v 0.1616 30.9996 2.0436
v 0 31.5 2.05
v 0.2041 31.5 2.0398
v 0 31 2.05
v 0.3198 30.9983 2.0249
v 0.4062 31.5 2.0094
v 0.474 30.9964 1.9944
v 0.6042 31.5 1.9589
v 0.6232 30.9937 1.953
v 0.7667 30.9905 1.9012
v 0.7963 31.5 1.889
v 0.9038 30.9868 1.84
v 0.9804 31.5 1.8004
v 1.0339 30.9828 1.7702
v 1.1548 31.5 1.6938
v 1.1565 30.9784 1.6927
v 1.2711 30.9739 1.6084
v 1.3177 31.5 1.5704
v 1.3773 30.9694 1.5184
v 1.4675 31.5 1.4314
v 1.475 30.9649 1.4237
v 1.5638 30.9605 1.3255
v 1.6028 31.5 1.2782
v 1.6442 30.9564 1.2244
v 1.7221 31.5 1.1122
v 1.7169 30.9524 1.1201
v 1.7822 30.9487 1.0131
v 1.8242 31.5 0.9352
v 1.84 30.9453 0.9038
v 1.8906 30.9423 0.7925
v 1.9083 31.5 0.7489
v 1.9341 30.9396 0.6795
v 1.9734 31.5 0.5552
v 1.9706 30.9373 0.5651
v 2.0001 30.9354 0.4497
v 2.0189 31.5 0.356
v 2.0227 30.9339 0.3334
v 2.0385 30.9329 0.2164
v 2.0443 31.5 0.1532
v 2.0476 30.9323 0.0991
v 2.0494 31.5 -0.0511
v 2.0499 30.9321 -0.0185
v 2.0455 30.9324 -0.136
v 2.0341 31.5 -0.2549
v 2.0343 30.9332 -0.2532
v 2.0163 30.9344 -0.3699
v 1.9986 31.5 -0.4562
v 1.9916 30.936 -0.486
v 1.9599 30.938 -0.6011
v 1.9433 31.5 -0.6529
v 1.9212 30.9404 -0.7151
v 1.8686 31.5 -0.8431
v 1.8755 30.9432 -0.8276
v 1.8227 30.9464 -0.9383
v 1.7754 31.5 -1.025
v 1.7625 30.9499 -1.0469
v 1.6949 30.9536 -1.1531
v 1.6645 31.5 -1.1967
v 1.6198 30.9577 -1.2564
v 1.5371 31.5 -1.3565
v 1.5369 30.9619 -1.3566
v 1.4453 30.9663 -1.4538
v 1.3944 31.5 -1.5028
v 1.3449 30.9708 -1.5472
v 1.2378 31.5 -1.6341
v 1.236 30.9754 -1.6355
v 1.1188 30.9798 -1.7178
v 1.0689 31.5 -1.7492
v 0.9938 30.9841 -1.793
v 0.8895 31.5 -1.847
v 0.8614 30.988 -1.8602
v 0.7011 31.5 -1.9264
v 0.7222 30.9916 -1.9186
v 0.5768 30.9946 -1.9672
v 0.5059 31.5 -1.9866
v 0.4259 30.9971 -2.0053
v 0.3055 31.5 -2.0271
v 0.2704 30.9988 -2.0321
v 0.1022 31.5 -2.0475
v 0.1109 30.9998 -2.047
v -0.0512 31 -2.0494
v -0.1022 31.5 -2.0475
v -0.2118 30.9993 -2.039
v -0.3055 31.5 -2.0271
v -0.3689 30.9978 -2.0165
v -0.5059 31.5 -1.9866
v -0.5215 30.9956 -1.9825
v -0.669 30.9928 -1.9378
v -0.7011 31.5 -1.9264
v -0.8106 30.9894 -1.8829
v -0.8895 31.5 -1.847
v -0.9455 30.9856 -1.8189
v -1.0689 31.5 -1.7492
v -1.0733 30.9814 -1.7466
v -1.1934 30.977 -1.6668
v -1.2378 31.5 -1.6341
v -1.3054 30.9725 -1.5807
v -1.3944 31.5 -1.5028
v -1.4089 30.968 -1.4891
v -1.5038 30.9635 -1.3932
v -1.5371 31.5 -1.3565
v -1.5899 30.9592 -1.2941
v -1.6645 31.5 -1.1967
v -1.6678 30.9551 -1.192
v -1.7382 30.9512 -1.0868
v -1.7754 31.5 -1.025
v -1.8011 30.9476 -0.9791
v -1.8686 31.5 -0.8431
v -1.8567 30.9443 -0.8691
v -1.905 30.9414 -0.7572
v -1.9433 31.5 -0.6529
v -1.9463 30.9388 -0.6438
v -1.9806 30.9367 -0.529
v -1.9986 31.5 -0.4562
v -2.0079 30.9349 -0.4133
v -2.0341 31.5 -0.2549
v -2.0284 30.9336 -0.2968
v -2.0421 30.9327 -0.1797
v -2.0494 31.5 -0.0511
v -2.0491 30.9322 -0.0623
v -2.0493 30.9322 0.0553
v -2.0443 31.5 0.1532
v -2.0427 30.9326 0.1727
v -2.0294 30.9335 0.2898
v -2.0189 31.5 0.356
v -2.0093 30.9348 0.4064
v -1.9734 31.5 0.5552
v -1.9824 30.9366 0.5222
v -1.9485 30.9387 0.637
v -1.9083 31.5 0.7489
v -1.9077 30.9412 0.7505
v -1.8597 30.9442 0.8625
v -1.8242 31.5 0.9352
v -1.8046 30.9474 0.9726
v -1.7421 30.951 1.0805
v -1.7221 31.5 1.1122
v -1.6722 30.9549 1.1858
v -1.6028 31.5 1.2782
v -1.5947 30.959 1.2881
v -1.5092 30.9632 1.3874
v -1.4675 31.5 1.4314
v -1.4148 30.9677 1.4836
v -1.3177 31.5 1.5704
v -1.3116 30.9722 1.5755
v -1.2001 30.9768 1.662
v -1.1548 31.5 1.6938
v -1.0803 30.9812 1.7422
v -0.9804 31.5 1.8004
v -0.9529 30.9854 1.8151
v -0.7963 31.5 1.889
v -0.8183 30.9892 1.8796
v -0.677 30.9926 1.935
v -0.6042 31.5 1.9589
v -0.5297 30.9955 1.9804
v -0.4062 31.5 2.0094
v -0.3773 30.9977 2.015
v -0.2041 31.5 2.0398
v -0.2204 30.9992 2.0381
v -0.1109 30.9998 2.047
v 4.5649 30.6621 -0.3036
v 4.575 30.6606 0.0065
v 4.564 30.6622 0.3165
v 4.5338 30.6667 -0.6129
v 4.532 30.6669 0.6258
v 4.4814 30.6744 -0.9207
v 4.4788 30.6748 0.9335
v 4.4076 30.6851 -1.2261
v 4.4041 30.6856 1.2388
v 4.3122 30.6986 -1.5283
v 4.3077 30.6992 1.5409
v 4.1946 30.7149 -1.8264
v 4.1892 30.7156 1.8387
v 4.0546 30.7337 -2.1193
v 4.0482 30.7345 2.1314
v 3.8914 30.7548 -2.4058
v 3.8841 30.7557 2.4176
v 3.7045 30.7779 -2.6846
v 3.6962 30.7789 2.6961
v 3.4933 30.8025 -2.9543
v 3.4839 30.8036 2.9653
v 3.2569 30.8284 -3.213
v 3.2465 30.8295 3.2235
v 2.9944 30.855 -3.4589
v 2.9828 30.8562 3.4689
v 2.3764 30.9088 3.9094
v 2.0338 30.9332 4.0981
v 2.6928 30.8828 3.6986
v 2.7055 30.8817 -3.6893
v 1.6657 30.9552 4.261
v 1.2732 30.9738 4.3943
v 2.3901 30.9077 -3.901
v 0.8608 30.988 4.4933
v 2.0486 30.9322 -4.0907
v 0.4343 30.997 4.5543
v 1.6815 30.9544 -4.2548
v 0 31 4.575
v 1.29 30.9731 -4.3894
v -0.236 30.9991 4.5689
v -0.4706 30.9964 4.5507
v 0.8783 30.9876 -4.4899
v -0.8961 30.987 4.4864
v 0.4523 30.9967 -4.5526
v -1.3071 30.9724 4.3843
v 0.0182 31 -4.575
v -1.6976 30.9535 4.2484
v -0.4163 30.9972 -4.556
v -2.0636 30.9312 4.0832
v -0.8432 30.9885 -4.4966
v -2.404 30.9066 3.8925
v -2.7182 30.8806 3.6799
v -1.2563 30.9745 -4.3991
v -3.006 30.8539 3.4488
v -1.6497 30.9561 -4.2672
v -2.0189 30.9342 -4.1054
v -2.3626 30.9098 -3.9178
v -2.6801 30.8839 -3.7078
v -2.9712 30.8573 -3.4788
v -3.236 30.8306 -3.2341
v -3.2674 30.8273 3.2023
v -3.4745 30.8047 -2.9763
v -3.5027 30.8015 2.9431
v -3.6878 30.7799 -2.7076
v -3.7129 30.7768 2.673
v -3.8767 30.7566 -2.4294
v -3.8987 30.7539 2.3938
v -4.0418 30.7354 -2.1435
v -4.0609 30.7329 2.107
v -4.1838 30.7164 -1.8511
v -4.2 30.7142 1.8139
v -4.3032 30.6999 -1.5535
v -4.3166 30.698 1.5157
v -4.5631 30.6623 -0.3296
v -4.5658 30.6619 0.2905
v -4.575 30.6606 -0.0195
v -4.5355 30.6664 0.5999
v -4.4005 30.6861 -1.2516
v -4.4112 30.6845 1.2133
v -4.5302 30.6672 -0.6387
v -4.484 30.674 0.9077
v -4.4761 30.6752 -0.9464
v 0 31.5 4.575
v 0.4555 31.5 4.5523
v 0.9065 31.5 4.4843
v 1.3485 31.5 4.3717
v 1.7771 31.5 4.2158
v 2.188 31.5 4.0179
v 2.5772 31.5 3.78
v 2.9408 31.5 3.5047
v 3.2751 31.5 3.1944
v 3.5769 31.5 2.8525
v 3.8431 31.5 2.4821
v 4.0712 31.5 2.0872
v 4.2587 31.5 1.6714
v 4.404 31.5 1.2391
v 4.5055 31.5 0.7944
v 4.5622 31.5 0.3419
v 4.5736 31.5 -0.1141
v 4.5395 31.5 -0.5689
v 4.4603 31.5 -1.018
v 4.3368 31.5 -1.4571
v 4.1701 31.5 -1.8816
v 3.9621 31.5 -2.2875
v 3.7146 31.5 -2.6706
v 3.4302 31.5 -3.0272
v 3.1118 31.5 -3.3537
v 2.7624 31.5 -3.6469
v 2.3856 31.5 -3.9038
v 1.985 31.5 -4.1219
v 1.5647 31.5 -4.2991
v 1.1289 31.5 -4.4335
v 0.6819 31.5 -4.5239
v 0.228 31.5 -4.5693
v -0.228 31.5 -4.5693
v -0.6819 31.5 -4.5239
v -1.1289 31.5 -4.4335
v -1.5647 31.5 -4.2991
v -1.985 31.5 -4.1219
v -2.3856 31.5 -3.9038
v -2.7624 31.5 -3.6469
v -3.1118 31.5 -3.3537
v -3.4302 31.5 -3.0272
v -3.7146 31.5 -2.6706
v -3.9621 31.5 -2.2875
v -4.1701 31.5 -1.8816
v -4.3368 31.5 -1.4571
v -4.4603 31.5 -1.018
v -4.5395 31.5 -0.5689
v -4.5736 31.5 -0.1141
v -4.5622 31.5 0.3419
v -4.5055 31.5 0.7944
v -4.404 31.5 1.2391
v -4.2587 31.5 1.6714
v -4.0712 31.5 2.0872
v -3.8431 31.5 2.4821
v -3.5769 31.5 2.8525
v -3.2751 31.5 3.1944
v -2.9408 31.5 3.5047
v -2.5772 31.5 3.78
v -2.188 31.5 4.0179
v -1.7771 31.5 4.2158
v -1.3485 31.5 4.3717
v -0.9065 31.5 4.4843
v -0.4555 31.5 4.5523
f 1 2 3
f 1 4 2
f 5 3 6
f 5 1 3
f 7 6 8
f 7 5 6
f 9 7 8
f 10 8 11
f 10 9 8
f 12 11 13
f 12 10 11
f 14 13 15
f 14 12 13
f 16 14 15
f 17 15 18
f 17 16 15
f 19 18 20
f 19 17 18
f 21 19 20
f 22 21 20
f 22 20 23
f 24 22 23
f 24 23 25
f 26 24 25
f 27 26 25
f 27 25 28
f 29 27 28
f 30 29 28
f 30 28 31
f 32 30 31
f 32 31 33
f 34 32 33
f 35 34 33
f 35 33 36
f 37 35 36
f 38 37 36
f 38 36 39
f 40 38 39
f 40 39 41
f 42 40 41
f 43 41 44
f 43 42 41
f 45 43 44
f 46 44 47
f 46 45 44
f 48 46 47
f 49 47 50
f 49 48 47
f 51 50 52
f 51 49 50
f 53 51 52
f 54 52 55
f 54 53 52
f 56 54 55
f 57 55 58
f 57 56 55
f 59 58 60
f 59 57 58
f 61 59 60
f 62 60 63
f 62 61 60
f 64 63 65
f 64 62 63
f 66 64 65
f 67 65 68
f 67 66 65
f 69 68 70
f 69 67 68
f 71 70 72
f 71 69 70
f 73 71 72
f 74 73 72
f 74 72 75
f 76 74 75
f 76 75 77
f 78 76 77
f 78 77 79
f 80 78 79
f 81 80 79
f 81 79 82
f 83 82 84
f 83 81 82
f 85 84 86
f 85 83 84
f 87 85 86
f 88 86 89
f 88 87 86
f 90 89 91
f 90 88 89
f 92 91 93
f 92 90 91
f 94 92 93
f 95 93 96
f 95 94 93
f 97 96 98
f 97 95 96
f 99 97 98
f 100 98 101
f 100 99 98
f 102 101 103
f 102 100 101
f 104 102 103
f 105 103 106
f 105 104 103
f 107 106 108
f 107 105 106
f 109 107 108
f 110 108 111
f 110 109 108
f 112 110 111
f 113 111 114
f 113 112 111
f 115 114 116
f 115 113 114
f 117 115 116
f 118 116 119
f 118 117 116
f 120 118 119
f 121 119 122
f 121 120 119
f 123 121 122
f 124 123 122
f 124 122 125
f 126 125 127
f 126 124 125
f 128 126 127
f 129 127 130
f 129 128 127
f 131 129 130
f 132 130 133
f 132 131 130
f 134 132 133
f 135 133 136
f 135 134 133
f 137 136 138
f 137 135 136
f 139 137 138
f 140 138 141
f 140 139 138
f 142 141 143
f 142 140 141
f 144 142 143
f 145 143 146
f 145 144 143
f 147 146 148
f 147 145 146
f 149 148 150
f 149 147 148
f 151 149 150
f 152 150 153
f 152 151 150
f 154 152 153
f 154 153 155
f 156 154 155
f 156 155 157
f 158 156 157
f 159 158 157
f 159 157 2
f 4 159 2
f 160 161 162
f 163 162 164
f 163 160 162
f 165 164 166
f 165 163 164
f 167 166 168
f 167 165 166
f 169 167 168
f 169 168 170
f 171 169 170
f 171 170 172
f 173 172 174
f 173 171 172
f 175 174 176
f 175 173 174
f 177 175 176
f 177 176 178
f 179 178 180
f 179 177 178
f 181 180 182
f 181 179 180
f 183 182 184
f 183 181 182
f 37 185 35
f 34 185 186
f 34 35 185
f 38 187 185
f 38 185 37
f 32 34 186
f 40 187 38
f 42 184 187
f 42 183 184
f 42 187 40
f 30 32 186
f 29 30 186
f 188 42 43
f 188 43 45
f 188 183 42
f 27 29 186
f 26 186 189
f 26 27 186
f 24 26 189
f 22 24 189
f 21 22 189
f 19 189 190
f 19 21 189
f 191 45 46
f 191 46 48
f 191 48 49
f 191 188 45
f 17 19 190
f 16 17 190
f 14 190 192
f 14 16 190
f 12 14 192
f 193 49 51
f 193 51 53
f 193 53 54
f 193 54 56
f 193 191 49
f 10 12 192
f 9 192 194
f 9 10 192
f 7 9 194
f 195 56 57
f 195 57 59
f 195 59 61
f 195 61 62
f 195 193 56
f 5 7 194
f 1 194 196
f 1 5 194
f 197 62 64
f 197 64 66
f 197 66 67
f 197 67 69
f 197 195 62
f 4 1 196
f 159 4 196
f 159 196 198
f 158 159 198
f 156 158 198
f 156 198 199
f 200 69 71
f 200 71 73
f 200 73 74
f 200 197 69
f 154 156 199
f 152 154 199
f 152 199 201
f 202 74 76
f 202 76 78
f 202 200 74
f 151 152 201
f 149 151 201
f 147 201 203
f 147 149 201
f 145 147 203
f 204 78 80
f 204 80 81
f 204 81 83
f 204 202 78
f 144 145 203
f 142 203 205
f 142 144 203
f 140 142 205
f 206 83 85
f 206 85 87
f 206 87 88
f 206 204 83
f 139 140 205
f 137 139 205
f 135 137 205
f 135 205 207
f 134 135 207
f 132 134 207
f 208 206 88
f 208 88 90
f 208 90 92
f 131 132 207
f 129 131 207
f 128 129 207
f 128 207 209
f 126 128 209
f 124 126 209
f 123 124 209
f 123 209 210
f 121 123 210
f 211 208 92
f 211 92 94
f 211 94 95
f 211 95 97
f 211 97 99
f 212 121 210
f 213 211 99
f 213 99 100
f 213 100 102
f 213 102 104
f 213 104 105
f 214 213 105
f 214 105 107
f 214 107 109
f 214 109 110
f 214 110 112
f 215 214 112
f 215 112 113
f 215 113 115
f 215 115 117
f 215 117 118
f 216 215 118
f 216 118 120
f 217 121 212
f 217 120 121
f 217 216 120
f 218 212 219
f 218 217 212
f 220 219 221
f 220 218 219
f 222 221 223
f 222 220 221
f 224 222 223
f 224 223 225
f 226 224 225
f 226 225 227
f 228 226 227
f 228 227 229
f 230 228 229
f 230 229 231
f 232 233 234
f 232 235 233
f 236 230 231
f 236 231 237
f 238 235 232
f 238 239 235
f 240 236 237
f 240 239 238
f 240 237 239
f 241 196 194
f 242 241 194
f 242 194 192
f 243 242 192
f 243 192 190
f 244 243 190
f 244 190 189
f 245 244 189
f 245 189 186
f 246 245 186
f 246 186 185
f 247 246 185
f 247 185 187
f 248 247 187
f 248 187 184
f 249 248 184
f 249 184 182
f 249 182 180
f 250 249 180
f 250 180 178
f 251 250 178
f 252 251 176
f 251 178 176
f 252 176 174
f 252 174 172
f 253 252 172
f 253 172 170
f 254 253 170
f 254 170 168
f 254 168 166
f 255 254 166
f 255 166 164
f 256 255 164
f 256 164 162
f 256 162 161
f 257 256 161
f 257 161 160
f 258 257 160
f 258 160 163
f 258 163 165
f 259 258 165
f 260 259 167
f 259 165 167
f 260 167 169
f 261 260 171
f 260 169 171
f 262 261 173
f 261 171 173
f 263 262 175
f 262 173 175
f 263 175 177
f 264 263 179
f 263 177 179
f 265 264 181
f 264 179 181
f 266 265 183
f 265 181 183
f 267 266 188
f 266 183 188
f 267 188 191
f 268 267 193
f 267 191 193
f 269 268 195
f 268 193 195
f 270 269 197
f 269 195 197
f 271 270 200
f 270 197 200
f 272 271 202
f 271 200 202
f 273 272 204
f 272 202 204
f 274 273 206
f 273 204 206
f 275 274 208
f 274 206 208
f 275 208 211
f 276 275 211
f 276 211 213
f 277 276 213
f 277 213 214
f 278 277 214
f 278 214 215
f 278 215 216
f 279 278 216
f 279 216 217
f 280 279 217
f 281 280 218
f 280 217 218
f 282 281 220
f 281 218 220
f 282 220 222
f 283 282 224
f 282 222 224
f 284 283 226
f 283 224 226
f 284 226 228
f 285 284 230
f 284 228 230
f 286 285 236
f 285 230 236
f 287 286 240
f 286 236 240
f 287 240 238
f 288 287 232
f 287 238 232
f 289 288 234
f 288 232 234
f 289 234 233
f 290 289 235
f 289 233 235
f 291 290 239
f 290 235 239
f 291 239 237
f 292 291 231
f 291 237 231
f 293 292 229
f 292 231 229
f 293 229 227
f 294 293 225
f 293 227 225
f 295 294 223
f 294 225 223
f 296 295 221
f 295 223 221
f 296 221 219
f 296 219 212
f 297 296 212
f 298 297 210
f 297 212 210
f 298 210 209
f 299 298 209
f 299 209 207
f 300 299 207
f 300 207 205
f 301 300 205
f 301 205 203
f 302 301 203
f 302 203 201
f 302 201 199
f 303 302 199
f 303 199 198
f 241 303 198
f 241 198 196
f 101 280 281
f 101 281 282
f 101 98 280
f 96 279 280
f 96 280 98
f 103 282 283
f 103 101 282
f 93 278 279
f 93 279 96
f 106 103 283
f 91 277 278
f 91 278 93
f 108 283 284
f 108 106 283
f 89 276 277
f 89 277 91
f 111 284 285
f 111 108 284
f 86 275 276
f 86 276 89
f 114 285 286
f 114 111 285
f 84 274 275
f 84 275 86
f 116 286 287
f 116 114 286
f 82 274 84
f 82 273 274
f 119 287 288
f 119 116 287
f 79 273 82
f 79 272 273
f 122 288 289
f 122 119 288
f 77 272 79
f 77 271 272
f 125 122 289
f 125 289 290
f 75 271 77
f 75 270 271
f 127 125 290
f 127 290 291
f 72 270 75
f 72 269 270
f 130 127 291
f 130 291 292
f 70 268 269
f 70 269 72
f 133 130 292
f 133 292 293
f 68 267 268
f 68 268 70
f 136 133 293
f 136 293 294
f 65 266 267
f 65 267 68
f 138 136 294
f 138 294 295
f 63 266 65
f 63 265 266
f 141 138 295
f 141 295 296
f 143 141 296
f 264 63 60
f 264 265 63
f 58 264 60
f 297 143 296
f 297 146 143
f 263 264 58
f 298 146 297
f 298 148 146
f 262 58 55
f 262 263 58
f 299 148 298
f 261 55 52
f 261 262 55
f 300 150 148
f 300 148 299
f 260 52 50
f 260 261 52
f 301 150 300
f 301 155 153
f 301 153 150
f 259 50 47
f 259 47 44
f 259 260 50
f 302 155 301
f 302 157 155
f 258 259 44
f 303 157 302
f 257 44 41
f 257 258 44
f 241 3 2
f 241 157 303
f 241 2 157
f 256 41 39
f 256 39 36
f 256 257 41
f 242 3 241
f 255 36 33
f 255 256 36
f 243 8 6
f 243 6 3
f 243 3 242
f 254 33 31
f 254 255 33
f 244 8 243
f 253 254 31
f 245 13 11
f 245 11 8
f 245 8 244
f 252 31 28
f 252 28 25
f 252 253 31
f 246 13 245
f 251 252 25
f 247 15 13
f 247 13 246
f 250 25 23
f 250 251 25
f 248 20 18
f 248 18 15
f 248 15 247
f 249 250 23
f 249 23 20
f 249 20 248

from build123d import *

# Parameters (mm, degrees)
SKETCH2_R               = 4.575
BOSS_EXTRUDE1_DEPTH     = 31.5
CUT_EXTRUDE1_DEPTH      = 33.15760019
CUT_EXTRUDE1_DEPTH_BACK = 33.15760019
SKETCH1_R               = 31
CUT_EXTRUDE2_DEPTH      = 7.524256813
CUT_EXTRUDE2_DEPTH_BACK = 7.524256813
SKETCH3_R               = 2.05


with BuildPart() as part:
    # Sketch2 → Boss-Extrude1 (new body)
    with BuildSketch(Plane(origin=(0, 0, 0), x_dir=(-1, 0, 0), z_dir=(0, 1, 0))):
        with Locations(Location((0, 0, 0), (0, 0, 90))):
            Circle(SKETCH2_R)
    extrude(amount=BOSS_EXTRUDE1_DEPTH)

    # Sketch1 → Cut-Extrude1 (cut, two sides: drawn at the far end of the back side and taken through both)
    with BuildSketch(Plane(origin=(0, 0, 0), x_dir=(0, 1, 0), z_dir=(0, 0, 1)).offset(-CUT_EXTRUDE1_DEPTH_BACK)):
        Circle(SKETCH1_R)
    extrude(amount=CUT_EXTRUDE1_DEPTH + CUT_EXTRUDE1_DEPTH_BACK, mode=Mode.SUBTRACT)

    # Sketch3 → Cut-Extrude2 (cut, two sides: drawn at the far end of the back side and taken through both)
    with BuildSketch(Plane(origin=(0, 31.5, 0), x_dir=(-1, 0, 0), z_dir=(0, 1, 0)).offset(-CUT_EXTRUDE2_DEPTH_BACK)):
        with Locations(Location((0, 0, 0), (0, 0, 90))):
            Circle(SKETCH3_R)
    extrude(amount=CUT_EXTRUDE2_DEPTH + CUT_EXTRUDE2_DEPTH_BACK, mode=Mode.SUBTRACT)


solid = part.part
